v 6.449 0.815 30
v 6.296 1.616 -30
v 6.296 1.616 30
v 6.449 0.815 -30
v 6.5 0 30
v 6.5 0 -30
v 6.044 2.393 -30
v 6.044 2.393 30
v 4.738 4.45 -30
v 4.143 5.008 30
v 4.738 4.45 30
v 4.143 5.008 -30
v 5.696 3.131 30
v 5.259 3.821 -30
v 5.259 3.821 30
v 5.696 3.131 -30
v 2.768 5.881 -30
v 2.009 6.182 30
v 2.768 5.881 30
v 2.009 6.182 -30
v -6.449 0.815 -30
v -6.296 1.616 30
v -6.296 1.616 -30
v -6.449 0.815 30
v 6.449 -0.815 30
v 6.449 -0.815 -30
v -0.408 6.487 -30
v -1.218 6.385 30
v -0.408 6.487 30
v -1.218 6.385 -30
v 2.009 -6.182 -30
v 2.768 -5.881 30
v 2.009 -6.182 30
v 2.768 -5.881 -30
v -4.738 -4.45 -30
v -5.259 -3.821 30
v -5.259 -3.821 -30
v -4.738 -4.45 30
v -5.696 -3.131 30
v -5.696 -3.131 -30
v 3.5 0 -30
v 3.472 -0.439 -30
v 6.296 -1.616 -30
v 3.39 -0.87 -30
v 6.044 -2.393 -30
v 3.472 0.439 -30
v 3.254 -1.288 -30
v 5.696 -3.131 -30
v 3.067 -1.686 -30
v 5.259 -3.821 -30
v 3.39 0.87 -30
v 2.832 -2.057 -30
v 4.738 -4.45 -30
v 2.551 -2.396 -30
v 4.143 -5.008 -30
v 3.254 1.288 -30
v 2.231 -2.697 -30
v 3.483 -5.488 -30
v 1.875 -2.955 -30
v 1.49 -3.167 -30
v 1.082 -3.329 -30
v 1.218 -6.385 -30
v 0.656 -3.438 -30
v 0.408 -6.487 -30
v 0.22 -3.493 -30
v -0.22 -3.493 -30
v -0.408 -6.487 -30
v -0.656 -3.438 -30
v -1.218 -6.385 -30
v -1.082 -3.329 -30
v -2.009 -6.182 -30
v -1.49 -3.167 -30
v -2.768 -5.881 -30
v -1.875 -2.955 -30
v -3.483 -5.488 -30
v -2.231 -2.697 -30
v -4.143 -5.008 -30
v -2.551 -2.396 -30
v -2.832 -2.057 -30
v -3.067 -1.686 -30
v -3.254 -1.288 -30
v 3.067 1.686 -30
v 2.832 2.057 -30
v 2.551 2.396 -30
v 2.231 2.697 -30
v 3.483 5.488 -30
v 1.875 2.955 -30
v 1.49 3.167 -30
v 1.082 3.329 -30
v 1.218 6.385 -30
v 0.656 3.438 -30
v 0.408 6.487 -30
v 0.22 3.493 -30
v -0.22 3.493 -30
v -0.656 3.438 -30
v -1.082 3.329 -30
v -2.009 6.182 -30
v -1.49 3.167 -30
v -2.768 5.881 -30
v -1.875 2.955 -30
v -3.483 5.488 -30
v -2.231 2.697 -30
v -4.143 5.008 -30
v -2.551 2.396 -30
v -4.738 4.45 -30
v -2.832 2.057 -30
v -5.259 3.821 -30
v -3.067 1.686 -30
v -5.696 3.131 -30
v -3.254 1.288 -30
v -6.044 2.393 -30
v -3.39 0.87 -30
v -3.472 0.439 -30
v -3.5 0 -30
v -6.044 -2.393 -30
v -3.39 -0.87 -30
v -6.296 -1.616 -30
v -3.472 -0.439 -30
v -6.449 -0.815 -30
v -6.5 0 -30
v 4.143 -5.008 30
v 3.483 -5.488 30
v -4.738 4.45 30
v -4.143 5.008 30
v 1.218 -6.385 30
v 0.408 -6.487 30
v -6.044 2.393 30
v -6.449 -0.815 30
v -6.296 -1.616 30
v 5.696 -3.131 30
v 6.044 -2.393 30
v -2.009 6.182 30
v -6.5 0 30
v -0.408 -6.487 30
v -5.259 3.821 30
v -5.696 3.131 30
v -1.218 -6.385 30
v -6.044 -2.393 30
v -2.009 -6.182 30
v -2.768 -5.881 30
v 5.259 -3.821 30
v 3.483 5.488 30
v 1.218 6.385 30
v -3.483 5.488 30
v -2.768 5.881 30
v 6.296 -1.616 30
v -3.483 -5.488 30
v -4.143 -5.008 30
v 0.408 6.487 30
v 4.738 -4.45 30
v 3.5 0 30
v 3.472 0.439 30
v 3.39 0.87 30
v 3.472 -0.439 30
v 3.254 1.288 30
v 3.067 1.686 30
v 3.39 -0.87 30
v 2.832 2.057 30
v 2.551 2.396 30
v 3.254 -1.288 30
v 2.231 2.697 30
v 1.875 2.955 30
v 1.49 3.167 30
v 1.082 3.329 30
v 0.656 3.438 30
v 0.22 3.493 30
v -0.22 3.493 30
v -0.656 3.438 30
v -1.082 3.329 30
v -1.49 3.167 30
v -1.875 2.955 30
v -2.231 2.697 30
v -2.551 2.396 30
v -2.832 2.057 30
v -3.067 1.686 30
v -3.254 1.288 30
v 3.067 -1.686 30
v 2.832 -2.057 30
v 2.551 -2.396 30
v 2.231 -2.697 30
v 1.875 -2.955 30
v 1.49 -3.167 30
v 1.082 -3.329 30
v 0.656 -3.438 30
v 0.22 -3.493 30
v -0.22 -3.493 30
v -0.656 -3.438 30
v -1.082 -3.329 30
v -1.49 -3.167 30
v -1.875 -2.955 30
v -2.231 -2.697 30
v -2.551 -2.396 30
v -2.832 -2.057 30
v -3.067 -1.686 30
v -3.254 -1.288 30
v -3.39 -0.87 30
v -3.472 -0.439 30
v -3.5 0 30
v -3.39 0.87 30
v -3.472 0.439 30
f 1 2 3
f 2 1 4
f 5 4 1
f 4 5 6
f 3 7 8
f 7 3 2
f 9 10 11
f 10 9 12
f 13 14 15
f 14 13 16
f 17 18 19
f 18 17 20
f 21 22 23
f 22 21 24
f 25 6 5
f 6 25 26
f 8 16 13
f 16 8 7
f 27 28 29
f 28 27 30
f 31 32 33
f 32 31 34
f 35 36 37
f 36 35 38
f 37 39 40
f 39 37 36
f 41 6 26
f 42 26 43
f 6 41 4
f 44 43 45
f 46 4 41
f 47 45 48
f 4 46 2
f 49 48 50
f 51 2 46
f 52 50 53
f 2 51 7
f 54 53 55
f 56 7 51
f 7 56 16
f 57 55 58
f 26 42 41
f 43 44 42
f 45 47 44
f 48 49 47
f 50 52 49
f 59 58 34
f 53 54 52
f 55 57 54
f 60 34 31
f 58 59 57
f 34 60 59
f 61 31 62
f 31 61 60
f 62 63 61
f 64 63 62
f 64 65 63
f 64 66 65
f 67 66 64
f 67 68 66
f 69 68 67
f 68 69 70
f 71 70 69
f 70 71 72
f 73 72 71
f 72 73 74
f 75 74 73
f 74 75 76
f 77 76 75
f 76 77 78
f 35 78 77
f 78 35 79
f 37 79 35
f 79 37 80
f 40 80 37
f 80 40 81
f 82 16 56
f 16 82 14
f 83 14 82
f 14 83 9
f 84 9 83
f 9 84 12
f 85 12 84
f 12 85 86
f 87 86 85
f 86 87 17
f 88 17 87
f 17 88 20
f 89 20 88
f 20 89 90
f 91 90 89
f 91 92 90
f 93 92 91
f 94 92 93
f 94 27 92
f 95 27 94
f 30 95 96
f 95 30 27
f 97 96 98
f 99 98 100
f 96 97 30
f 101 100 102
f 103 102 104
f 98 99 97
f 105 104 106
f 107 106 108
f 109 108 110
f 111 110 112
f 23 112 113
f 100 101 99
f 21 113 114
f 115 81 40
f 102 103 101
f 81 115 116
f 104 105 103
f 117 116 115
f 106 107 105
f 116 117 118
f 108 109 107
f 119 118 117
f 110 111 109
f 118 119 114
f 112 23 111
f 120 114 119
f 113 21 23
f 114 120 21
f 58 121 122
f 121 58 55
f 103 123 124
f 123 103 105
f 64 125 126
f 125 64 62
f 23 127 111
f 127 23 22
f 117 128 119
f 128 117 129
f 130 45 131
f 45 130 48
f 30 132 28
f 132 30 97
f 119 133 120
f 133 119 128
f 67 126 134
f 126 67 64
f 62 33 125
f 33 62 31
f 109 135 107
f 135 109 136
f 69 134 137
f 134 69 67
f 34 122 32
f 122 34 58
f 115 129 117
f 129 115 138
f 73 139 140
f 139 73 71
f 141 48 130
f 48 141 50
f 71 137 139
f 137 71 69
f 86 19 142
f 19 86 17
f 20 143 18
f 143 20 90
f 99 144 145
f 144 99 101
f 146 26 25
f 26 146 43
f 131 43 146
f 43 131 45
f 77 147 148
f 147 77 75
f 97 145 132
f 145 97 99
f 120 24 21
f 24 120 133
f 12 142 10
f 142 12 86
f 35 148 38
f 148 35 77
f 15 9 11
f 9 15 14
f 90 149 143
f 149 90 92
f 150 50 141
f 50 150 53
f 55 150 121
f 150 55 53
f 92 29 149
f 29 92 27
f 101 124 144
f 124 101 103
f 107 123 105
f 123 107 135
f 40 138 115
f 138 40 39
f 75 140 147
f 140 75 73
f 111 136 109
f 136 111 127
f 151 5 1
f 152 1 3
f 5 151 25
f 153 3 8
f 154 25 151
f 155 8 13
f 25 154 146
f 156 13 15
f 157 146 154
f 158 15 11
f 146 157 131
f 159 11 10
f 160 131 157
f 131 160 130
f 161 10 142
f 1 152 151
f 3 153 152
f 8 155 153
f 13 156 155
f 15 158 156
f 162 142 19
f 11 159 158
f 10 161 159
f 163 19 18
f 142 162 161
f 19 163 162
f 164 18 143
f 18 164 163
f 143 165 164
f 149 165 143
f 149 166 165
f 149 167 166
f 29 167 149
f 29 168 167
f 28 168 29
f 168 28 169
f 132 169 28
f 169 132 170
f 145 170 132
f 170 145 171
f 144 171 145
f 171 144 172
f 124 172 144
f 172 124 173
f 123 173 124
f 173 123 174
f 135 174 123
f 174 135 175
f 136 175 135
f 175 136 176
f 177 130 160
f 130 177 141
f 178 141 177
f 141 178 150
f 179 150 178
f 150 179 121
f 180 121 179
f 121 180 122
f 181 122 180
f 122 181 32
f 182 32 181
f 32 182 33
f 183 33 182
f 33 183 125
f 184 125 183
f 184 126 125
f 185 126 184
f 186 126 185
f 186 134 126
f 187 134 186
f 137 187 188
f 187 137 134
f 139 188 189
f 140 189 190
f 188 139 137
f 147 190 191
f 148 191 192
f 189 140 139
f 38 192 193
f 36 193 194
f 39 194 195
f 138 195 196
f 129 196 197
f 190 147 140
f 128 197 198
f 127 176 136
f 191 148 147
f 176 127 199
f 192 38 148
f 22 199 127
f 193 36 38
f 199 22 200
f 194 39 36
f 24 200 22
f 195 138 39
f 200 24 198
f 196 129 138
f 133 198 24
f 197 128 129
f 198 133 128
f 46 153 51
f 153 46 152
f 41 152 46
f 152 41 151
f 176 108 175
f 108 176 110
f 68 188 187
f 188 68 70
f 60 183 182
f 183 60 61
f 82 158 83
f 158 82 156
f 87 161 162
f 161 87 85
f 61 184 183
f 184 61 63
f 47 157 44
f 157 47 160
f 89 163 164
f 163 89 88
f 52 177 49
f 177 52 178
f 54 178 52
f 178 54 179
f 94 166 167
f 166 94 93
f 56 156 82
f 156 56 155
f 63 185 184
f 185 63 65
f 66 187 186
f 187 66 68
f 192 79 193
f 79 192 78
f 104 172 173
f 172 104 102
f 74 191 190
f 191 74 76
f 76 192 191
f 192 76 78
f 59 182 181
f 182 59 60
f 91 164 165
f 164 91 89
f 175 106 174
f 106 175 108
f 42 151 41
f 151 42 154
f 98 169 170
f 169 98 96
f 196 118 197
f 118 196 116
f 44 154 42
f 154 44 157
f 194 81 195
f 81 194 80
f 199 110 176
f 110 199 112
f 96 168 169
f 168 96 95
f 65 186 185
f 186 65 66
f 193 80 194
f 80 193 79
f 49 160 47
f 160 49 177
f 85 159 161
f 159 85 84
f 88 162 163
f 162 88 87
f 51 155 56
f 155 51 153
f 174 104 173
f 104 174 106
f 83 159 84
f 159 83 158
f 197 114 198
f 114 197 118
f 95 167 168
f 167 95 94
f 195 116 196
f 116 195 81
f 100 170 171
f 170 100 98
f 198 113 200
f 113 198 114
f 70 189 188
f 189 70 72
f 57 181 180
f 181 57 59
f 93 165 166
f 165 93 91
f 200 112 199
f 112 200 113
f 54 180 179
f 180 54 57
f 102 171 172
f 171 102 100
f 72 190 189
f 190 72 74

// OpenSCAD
$fn = 50;


difference() {
	union() {
		translate(v = [0, 0, -30.0000000000]) {
			cylinder(h = 60, r = 6.5000000000);
		}
	}
	union() {
		translate(v = [0, 0, -100.0000000000]) {
			cylinder(h = 200, r = 3.5000000000);
		}
	}
}
